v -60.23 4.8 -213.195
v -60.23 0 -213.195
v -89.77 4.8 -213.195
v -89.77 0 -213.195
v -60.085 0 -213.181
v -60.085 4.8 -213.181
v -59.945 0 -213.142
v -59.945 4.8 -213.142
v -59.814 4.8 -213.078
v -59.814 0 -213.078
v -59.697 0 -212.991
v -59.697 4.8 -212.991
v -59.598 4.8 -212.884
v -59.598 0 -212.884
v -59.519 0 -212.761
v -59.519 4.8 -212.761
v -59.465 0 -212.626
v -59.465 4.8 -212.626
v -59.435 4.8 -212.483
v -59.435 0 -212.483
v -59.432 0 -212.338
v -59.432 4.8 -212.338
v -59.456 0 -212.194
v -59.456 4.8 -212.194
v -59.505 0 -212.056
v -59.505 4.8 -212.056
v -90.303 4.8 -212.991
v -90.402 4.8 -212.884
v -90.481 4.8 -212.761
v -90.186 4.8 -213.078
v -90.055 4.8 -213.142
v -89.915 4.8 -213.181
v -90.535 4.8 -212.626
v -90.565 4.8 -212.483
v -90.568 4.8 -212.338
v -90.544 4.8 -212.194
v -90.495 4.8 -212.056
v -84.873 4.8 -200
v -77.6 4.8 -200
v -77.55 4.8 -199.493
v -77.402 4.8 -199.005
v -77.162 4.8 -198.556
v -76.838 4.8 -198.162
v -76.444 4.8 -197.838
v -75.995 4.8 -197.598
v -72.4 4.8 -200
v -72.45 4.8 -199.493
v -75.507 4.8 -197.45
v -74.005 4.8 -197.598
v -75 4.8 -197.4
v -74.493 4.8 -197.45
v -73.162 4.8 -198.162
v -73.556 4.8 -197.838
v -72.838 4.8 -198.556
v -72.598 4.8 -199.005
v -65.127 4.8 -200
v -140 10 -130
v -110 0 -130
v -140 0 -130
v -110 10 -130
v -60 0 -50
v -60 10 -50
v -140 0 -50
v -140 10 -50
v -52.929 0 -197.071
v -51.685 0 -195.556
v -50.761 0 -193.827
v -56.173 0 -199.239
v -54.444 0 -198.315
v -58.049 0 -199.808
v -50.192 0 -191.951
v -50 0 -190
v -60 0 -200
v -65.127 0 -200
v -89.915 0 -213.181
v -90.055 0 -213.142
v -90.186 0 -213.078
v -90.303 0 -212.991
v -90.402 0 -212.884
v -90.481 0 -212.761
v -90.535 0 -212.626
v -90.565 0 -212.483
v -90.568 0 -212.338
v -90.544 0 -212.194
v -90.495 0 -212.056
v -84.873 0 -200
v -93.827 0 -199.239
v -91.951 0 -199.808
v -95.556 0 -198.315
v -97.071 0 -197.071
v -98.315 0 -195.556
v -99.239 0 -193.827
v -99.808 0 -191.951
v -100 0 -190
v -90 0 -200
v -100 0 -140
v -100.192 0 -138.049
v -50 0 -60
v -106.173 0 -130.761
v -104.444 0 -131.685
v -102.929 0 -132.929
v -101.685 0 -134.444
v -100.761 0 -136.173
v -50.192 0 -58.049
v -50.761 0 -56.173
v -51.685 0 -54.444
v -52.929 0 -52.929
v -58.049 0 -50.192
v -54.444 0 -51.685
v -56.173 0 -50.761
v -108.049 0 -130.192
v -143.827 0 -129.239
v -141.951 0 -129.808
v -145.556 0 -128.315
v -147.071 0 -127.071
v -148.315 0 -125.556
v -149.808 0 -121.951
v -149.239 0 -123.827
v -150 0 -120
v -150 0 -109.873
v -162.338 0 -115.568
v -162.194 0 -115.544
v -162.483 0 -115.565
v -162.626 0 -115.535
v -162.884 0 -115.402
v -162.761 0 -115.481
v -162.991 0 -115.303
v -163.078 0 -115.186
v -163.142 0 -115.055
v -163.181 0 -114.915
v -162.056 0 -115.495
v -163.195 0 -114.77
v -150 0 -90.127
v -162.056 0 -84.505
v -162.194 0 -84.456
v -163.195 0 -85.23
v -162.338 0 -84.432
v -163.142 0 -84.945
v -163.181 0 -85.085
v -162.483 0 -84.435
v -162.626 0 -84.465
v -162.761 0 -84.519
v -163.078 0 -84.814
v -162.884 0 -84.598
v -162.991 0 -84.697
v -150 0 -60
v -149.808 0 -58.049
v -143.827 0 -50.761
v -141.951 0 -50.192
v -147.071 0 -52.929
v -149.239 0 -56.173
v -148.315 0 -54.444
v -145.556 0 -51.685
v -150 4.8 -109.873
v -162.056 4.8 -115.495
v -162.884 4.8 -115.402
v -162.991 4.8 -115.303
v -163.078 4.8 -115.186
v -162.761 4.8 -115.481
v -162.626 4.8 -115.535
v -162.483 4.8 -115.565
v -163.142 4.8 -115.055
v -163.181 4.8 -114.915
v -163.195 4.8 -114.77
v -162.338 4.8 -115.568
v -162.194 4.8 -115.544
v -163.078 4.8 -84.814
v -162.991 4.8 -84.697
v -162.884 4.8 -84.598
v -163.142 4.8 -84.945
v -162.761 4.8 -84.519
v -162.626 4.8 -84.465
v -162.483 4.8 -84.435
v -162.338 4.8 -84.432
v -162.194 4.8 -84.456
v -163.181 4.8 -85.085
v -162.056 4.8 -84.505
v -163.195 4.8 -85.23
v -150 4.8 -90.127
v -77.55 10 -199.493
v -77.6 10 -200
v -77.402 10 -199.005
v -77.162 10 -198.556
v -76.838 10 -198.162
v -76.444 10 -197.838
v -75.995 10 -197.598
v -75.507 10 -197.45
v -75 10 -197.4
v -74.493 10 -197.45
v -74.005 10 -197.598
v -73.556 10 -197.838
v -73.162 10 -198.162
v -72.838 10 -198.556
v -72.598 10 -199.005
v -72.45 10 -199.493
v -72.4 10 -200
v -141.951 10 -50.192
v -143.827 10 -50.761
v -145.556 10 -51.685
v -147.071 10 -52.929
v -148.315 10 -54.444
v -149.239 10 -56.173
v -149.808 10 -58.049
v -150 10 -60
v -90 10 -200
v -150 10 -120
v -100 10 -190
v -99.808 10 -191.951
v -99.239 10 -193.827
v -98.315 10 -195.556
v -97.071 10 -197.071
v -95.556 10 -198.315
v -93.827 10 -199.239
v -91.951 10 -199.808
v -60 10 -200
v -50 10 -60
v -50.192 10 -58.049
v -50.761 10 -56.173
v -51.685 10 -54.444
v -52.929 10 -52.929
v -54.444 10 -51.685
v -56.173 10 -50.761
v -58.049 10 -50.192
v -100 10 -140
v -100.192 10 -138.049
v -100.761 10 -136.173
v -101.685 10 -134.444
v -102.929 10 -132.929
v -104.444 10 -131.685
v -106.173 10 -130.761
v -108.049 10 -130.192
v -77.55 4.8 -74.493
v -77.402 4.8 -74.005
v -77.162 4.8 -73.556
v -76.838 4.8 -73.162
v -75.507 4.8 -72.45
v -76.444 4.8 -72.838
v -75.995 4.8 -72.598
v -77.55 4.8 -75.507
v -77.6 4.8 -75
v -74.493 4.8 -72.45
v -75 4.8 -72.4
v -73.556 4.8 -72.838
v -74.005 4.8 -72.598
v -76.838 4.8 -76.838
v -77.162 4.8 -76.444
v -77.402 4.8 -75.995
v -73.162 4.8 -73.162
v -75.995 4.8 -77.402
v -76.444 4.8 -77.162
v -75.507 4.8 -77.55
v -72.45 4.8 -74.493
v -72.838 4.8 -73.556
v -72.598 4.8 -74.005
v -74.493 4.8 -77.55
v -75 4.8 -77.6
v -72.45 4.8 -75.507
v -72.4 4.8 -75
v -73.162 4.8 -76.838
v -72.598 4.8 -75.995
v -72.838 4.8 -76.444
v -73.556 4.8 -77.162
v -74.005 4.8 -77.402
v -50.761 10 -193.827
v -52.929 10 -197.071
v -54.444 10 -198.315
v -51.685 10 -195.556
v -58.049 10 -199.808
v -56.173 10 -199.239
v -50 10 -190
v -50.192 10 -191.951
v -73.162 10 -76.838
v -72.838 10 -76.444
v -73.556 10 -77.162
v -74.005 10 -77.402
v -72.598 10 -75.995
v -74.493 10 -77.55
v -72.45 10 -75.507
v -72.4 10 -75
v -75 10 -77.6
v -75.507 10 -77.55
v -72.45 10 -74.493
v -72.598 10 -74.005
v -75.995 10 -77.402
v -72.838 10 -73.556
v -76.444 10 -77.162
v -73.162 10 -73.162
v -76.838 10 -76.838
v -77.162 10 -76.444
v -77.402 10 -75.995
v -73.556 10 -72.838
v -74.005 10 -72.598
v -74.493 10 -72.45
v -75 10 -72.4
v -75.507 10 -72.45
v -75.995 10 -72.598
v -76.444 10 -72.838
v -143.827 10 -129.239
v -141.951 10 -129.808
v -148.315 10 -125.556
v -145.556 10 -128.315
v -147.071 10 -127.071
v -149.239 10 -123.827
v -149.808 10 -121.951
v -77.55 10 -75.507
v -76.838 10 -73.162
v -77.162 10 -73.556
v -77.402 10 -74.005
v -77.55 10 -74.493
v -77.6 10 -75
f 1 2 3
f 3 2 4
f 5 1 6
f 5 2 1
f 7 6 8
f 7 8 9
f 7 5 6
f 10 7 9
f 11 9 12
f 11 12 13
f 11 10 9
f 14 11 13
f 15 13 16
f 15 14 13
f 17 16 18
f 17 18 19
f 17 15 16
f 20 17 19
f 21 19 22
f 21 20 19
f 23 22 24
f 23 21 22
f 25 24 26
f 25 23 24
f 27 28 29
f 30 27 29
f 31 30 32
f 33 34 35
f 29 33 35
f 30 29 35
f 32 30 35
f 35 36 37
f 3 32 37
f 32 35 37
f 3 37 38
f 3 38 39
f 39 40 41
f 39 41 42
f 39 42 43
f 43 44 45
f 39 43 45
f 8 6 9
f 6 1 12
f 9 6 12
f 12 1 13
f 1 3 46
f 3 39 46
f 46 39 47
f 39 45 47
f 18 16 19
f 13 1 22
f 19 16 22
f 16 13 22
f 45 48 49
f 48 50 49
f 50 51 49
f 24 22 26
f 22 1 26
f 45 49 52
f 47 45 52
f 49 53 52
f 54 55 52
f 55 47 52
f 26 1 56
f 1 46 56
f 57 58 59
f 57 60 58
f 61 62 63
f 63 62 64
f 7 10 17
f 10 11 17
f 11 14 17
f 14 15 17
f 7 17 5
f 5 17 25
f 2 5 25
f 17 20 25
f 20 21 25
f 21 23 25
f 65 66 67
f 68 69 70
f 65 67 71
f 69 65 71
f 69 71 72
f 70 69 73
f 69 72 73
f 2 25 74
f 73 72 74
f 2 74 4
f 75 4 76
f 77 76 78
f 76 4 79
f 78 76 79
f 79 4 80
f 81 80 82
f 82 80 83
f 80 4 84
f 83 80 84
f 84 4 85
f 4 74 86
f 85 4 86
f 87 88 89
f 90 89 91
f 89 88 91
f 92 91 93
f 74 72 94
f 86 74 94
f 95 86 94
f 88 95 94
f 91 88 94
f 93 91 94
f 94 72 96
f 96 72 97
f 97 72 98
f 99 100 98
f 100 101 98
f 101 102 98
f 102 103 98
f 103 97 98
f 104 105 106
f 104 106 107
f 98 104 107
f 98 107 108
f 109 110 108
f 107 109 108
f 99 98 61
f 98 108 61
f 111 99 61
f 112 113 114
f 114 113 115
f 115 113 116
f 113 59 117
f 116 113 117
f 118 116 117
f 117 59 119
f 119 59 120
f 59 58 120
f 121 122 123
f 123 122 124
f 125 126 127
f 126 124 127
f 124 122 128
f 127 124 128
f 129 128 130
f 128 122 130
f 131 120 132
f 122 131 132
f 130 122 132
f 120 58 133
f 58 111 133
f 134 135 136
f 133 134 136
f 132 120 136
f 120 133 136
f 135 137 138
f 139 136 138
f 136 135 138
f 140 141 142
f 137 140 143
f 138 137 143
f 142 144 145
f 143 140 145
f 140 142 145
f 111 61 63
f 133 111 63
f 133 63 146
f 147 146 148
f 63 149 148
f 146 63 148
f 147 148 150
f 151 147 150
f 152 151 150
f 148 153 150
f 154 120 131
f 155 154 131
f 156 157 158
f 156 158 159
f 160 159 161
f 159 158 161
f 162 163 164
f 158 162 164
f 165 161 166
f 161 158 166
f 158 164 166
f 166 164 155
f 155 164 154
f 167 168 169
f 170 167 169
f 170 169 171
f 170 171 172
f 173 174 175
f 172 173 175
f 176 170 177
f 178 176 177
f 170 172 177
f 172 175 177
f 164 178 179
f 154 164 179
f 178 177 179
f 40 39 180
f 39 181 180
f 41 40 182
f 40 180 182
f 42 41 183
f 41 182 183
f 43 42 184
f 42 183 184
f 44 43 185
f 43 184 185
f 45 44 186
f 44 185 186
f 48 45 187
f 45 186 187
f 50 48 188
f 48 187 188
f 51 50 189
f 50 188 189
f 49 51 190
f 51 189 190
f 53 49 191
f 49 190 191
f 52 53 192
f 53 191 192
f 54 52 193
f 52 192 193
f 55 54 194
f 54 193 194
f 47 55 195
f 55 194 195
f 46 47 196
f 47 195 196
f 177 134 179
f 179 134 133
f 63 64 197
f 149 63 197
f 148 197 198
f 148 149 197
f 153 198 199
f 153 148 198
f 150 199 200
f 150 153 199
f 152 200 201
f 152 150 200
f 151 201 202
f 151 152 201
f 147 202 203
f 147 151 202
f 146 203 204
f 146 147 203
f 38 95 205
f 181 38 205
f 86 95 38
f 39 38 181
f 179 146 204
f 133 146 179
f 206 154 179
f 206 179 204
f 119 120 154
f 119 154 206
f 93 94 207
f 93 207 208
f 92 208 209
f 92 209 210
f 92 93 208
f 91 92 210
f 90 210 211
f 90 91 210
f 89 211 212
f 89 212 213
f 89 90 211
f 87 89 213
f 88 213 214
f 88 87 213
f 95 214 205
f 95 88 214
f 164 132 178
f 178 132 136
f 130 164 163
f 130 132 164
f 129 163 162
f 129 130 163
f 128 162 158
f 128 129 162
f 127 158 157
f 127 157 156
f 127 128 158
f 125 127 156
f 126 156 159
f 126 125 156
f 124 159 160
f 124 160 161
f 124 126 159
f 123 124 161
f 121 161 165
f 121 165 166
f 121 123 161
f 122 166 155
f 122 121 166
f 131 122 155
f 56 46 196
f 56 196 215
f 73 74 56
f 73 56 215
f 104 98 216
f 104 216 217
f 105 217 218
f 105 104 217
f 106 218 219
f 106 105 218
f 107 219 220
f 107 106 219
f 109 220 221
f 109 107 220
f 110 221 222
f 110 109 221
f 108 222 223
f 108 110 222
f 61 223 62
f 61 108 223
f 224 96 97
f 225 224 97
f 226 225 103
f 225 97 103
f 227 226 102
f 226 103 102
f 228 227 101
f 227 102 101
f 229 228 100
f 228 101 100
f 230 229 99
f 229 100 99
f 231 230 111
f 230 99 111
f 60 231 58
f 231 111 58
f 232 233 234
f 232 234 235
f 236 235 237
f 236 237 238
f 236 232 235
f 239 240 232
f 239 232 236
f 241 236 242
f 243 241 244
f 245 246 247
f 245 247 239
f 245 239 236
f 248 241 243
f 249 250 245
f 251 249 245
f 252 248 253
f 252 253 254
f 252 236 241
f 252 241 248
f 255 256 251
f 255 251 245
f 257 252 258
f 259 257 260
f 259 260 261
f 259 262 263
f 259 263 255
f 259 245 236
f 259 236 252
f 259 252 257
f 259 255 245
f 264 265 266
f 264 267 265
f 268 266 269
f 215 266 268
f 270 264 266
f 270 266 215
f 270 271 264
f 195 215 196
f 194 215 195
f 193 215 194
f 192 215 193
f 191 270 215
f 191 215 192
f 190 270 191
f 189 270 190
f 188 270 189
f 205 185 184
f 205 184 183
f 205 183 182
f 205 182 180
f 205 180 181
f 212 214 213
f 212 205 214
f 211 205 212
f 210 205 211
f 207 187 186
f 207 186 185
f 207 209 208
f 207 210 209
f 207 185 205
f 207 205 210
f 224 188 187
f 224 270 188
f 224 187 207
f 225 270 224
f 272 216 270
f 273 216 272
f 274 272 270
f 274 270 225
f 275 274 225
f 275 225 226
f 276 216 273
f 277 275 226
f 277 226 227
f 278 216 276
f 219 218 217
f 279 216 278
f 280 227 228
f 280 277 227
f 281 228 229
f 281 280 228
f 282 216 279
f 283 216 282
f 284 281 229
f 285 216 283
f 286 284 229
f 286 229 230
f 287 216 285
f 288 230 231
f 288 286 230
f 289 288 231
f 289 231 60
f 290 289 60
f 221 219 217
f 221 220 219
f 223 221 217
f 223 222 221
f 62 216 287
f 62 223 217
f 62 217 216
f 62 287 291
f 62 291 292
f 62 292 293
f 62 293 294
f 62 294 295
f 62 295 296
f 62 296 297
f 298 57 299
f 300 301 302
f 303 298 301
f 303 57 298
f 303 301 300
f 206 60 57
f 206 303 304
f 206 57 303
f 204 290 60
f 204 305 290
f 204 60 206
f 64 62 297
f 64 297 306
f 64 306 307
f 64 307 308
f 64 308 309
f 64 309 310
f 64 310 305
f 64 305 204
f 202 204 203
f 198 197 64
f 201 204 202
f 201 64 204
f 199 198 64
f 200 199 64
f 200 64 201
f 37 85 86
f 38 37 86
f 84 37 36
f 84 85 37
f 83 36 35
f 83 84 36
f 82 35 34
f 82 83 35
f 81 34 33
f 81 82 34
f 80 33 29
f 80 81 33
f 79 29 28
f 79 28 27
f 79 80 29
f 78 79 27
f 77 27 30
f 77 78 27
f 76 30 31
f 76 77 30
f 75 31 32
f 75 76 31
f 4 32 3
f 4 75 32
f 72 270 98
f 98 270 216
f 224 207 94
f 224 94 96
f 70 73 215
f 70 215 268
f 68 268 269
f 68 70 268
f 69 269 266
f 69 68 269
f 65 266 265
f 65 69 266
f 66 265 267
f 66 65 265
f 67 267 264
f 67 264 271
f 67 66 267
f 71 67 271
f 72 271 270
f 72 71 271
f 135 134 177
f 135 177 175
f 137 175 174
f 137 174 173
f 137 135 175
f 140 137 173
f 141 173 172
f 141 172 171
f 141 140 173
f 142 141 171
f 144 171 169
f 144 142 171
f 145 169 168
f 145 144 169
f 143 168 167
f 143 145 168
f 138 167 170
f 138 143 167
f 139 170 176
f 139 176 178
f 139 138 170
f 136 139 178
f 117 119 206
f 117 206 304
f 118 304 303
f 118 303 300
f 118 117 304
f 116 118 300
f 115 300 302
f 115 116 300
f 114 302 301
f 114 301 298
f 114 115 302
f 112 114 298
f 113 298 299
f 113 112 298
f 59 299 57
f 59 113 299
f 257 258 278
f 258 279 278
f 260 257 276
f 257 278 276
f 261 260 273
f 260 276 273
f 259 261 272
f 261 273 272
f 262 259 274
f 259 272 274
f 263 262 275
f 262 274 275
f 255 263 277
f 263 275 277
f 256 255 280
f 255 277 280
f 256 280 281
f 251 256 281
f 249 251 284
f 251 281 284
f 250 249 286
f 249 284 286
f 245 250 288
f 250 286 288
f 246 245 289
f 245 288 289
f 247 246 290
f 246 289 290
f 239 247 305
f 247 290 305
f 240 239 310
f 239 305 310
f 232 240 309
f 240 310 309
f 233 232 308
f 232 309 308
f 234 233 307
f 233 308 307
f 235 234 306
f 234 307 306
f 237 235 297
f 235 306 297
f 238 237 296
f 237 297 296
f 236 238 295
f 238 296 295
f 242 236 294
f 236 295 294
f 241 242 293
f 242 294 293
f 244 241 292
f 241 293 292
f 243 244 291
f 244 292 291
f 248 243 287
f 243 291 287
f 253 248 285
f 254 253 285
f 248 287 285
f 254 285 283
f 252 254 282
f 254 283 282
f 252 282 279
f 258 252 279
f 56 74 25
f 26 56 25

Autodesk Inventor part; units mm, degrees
ref_plane "YZ Plane" through (0, 0, 0) normal (1, 0, 0) x (0, 1, 0)
ref_plane "XZ Plane" through (0, 0, 0) normal (0, 1, 0) x (-1, 0, 0)
ref_plane "XY Plane" through (0, 0, 0) normal (0, 0, 1) x (1, 0, 0)
sketch "Sketch1" plane through (0, 0, 0) normal (0, 1, 0) x (-1, 0, 0)
  line L0 (0, 0) -> (150, 0)
  line L1 (150, 0) -> (150, -200)
  line L2 (150, -200) -> (0, -200)
  line L3 (0, -200) -> (0, 0)
  line L4 (150, -200) -> (150, -143.8709)
  dimension "d0" = 150
  dimension "d1" = 200
extrude "Extrusion1" add sketch "Sketch1" along normal blind 10
sketch "Sketch3" plane through (0, 0, 0) normal (0, -1, 0) x (1, 0, 0)
  line L0 (-85, -199.8) -> (-85, -213.2303) construction
  line L1 (0, -200) -> (-150, -200) projected
  line L2 (-75, -213.1946) -> (-89.7696, -213.1946)
  arc A0 (-90.4946, -212.0565) -> (-89.7696, -213.1946) centre (-89.7696, -212.3946) ccw
  line L3 (-90.4946, -212.0565) -> (-84.8726, -200)
  line L4 (-84.8726, -200) -> (-65.1274, -200)
  line L5 (-65.1274, -200) -> (-59.5054, -212.0565)
  arc A1 (-60.2304, -213.1946) -> (-59.5054, -212.0565) centre (-60.2304, -212.3946) ccw
  line L6 (-60.2304, -213.1946) -> (-75, -213.1946)
  line L7 (-149.8, -90) -> (-163.2303, -90) construction
  line L8 (-163.1946, -100) -> (-163.1946, -85.2304)
  arc A2 (-162.0565, -84.5054) -> (-163.1946, -85.2304) centre (-162.3946, -85.2304) ccw
  line L9 (-162.0565, -84.5054) -> (-150, -90.1274)
  line L10 (-150, -90.1274) -> (-150, -109.8726)
  line L11 (-150, -109.8726) -> (-162.0565, -115.4946)
  arc A3 (-163.1946, -114.7696) -> (-162.0565, -115.4946) centre (-162.3946, -114.7696) ccw
  line L12 (-163.1946, -114.7696) -> (-163.1946, -100)
  line L13 (-150, -200) -> (-150, 0) projected
  point P0 (0, 0)
  point P1 (-75, -200)
  point P2 (-75, -200)
  point P3 (-150, -100)
  point P4 (-150, -100)
  point P5 (-150, -100)
extrude "Extrusion3" add sketch "Sketch3" against normal blind 4.8
sketch "Sketch5" plane through (0, 10, 0) normal (0, 1, 0) x (1, 0, 0)
  line L0 (-150, 200) -> (-150, 0) projected
  line L1 (-150, 0) -> (-75, 0)
  line L2 (-150, 0) -> (0, 0) projected
  line L3 (-75, 0) -> (-75, 75)
  circle A0 centre (-75, 75) radius 2.5
  circle A1 centre (-75, 75) radius 2.6
  line L4 (-150, 200) -> (-150, 0) projected
  line L5 (-150, 200) -> (-75, 200)
  line L6 (0, 200) -> (-150, 200) projected
  circle A2 centre (-75, 200) radius 2.5
  circle A3 centre (-75, 200) radius 2.6
  point P0 (-150, 89.7793)
  point P1 (-150, 110.2207)
  dimension "d17" = 75
  dimension "d18" = 5
  dimension "d19" = 0.1
  dimension "d20" = 5
  dimension "d21" = 0.1
extrude "Extrusion4" cut sketch "Sketch5" against normal blind 5.2 contours A0 | A1 | A3 L6 A2 L5 | L5 A2 L6 A3 | A2 L6 L5 | L5 L6 A2
sketch "Sketch7" plane through (0, 10, 0) normal (0, 1, 0) x (1, 0, 0)
  line L0 (0, 0) -> (0, 200) projected
  line L1 (-150, 0) -> (0, 0) projected
  line L2 (0, 200) -> (-50, 200)
  line L3 (-50, 200) -> (-50, 0)
  line L4 (-50, 0) -> (0, 0)
  line L5 (0, 0) -> (0, 200)
  line L6 (-150, 0) -> (0, 0)
  line L7 (0, 0) -> (0, 50)
  line L8 (0, 50) -> (-150, 50)
  line L9 (-150, 50) -> (-150, 0)
  line L10 (-150, 200) -> (-100, 200)
  line L11 (-100, 200) -> (-100, 130)
  line L12 (-100, 130) -> (-150, 130)
  line L13 (-150, 130) -> (-150, 200)
  point P0 (-50, 50)
  dimension "d24" = 50
  dimension "d25" = 50
  dimension "d26" = 50
  dimension "d27" = 70
extrude "Extrusion5" cut sketch "Sketch7" against normal blind 10
fillet "Fillet1" radius 10 6 edges at (-50, 5, -200) (-100, 5, -200) (-150, 5, -130) (-100, 5, -130) (-50, 5, -50) (-150, 5, -50)
properties part number "Area nv"
